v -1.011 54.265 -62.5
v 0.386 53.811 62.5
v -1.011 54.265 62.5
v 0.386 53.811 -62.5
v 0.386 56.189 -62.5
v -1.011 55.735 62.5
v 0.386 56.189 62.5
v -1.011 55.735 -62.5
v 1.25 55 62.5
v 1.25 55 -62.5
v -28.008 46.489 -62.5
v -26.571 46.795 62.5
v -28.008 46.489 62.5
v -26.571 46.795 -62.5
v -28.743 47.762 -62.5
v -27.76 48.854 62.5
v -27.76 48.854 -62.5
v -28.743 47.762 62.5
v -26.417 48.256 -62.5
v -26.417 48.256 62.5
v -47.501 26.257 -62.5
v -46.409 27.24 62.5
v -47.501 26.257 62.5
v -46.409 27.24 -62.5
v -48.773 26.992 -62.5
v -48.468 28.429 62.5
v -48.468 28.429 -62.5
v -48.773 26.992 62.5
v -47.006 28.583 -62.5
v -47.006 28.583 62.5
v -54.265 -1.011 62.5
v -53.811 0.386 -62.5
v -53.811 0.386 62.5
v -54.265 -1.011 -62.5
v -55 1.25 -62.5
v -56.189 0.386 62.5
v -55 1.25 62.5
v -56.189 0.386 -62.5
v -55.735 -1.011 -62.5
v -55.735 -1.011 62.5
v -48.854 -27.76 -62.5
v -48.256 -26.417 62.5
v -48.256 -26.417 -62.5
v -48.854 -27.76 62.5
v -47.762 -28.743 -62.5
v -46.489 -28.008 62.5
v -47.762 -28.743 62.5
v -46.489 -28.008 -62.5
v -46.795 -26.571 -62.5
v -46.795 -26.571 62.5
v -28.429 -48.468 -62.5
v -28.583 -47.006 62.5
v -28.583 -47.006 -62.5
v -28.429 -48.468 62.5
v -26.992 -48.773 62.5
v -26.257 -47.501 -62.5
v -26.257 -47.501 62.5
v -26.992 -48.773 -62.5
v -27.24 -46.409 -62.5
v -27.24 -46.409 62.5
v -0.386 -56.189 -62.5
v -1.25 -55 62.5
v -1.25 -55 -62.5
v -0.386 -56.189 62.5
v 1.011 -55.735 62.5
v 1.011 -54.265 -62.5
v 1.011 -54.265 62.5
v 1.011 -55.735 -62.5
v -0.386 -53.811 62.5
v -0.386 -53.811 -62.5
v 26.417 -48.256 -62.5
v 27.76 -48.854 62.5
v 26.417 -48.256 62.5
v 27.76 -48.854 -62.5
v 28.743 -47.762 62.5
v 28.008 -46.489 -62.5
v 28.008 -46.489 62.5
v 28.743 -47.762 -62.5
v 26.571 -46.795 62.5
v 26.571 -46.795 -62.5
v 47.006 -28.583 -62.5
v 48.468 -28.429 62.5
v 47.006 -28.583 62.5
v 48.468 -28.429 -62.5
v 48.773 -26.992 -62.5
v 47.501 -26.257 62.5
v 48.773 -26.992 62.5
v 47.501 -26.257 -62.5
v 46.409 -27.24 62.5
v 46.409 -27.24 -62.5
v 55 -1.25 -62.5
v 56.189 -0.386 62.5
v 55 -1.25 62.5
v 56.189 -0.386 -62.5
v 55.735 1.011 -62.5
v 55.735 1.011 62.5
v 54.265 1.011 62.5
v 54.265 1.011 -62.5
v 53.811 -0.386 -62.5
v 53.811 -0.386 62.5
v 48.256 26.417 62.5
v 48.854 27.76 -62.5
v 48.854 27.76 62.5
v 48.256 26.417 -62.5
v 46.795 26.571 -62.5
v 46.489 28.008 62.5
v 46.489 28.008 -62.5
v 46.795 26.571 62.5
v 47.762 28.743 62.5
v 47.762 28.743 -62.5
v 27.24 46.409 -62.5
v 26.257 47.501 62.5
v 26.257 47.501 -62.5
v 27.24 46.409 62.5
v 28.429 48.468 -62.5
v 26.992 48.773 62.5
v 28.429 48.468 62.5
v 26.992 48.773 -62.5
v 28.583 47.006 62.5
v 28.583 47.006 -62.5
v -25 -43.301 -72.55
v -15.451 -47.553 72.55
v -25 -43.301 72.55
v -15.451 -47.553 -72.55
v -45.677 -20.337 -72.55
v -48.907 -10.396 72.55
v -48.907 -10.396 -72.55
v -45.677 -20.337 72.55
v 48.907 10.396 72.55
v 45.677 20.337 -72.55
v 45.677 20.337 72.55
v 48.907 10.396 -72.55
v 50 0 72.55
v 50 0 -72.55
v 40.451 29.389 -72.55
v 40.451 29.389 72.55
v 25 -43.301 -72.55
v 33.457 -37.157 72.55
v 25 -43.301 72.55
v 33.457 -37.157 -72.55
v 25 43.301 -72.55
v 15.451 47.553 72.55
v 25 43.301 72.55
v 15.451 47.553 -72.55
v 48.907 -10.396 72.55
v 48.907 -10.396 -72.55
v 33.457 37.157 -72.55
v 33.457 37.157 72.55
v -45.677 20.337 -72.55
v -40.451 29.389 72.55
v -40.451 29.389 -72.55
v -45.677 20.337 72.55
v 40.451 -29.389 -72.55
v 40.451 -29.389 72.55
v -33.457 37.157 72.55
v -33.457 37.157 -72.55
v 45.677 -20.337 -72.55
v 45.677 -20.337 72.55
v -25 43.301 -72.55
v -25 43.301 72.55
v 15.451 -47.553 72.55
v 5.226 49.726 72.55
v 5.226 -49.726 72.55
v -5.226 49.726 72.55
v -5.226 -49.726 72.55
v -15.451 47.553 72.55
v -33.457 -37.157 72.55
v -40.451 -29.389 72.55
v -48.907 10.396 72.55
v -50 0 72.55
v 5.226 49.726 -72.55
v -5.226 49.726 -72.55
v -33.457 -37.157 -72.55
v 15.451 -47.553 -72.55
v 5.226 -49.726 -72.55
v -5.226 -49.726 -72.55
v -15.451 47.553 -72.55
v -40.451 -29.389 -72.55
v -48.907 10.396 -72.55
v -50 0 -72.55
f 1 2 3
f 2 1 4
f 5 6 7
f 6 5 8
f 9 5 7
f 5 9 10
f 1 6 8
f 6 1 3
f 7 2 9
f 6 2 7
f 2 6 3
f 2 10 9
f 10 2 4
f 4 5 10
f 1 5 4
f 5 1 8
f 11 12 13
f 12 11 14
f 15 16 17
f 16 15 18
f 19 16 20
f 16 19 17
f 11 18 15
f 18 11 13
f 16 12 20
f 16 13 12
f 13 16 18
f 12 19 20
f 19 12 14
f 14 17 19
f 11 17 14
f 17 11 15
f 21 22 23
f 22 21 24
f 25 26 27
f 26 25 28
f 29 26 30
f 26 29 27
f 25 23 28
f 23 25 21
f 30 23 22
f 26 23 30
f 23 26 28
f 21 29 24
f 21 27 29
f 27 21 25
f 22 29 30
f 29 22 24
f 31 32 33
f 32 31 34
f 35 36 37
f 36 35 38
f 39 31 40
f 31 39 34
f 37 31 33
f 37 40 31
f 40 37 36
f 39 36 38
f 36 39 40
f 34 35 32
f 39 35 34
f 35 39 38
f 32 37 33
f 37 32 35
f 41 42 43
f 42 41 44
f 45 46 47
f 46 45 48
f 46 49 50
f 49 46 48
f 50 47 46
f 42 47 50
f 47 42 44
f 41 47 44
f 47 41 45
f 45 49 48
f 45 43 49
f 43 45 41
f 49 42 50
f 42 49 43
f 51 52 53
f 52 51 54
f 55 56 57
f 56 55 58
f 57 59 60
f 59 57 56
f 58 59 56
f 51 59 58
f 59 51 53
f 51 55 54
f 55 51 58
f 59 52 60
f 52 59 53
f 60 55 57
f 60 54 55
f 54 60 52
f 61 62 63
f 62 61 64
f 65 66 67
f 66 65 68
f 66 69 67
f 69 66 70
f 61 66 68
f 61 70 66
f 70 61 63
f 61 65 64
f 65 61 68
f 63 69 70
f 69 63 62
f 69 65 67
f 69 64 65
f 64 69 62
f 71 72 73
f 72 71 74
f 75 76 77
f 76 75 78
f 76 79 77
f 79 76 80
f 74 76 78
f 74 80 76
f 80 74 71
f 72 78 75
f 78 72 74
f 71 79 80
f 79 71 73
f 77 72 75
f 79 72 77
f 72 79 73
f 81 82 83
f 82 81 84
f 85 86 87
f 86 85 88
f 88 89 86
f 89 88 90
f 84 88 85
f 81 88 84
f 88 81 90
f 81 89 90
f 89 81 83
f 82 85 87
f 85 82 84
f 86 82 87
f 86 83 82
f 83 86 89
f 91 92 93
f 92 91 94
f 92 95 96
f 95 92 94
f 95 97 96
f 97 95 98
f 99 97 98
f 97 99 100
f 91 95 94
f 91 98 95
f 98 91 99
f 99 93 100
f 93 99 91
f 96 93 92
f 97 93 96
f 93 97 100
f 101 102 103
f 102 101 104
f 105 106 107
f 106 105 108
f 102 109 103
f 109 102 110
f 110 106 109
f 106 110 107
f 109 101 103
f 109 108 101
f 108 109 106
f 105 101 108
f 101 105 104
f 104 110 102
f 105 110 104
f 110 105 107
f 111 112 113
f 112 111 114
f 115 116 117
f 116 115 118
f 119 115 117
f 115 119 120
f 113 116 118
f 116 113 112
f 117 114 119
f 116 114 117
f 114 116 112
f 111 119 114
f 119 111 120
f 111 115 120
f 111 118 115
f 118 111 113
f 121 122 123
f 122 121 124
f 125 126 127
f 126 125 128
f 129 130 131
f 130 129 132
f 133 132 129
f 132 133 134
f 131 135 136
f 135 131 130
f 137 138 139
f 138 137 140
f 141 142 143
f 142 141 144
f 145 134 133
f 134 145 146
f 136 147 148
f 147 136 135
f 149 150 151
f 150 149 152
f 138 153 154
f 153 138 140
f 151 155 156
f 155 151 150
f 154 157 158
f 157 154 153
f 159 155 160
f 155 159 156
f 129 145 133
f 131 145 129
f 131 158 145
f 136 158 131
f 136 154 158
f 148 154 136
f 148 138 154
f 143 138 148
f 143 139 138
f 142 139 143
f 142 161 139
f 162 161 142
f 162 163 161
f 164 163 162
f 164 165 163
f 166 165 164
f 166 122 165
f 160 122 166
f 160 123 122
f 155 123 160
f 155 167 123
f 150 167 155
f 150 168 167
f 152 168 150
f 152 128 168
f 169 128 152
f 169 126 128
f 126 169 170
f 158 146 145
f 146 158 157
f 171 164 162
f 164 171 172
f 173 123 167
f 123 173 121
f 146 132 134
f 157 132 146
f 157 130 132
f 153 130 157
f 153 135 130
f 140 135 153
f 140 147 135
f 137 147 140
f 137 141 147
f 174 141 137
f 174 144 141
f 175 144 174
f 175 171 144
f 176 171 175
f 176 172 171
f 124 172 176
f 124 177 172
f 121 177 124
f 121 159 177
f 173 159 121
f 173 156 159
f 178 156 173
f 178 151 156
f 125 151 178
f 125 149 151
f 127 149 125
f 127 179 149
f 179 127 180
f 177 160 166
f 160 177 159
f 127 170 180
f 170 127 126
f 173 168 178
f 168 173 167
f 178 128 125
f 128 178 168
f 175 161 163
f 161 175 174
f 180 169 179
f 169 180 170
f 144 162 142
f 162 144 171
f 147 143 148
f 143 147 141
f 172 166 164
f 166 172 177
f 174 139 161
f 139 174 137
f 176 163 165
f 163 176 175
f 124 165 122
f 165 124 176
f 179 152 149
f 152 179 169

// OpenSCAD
tol=0.1;    // [mm]
Ds  = 69;   // speaker
DsH =2.5;   // holes
SQs = 78;   // square
SQh = 60;     // sq for holes
Dm  =100;   // membrane
perf = 4;   // perforations
width=10;   // thickness
xlen = 1.25*Dm;
ylen = 1.25*Dm;
zlen = 1.25*Dm;
screwQuant = 12;

cylinder(h=ylen+2*width+tol, d=Dm, center=true);
maxi=screwQuant-1;
for(i=[0:1:screwQuant-1])
{
    rotate([0,0,i*360/screwQuant])
    {
        translate([0,DsH*2+Dm/2,0])
        {
            cylinder(h=ylen, d=DsH, center=true);
        }
    }
}
